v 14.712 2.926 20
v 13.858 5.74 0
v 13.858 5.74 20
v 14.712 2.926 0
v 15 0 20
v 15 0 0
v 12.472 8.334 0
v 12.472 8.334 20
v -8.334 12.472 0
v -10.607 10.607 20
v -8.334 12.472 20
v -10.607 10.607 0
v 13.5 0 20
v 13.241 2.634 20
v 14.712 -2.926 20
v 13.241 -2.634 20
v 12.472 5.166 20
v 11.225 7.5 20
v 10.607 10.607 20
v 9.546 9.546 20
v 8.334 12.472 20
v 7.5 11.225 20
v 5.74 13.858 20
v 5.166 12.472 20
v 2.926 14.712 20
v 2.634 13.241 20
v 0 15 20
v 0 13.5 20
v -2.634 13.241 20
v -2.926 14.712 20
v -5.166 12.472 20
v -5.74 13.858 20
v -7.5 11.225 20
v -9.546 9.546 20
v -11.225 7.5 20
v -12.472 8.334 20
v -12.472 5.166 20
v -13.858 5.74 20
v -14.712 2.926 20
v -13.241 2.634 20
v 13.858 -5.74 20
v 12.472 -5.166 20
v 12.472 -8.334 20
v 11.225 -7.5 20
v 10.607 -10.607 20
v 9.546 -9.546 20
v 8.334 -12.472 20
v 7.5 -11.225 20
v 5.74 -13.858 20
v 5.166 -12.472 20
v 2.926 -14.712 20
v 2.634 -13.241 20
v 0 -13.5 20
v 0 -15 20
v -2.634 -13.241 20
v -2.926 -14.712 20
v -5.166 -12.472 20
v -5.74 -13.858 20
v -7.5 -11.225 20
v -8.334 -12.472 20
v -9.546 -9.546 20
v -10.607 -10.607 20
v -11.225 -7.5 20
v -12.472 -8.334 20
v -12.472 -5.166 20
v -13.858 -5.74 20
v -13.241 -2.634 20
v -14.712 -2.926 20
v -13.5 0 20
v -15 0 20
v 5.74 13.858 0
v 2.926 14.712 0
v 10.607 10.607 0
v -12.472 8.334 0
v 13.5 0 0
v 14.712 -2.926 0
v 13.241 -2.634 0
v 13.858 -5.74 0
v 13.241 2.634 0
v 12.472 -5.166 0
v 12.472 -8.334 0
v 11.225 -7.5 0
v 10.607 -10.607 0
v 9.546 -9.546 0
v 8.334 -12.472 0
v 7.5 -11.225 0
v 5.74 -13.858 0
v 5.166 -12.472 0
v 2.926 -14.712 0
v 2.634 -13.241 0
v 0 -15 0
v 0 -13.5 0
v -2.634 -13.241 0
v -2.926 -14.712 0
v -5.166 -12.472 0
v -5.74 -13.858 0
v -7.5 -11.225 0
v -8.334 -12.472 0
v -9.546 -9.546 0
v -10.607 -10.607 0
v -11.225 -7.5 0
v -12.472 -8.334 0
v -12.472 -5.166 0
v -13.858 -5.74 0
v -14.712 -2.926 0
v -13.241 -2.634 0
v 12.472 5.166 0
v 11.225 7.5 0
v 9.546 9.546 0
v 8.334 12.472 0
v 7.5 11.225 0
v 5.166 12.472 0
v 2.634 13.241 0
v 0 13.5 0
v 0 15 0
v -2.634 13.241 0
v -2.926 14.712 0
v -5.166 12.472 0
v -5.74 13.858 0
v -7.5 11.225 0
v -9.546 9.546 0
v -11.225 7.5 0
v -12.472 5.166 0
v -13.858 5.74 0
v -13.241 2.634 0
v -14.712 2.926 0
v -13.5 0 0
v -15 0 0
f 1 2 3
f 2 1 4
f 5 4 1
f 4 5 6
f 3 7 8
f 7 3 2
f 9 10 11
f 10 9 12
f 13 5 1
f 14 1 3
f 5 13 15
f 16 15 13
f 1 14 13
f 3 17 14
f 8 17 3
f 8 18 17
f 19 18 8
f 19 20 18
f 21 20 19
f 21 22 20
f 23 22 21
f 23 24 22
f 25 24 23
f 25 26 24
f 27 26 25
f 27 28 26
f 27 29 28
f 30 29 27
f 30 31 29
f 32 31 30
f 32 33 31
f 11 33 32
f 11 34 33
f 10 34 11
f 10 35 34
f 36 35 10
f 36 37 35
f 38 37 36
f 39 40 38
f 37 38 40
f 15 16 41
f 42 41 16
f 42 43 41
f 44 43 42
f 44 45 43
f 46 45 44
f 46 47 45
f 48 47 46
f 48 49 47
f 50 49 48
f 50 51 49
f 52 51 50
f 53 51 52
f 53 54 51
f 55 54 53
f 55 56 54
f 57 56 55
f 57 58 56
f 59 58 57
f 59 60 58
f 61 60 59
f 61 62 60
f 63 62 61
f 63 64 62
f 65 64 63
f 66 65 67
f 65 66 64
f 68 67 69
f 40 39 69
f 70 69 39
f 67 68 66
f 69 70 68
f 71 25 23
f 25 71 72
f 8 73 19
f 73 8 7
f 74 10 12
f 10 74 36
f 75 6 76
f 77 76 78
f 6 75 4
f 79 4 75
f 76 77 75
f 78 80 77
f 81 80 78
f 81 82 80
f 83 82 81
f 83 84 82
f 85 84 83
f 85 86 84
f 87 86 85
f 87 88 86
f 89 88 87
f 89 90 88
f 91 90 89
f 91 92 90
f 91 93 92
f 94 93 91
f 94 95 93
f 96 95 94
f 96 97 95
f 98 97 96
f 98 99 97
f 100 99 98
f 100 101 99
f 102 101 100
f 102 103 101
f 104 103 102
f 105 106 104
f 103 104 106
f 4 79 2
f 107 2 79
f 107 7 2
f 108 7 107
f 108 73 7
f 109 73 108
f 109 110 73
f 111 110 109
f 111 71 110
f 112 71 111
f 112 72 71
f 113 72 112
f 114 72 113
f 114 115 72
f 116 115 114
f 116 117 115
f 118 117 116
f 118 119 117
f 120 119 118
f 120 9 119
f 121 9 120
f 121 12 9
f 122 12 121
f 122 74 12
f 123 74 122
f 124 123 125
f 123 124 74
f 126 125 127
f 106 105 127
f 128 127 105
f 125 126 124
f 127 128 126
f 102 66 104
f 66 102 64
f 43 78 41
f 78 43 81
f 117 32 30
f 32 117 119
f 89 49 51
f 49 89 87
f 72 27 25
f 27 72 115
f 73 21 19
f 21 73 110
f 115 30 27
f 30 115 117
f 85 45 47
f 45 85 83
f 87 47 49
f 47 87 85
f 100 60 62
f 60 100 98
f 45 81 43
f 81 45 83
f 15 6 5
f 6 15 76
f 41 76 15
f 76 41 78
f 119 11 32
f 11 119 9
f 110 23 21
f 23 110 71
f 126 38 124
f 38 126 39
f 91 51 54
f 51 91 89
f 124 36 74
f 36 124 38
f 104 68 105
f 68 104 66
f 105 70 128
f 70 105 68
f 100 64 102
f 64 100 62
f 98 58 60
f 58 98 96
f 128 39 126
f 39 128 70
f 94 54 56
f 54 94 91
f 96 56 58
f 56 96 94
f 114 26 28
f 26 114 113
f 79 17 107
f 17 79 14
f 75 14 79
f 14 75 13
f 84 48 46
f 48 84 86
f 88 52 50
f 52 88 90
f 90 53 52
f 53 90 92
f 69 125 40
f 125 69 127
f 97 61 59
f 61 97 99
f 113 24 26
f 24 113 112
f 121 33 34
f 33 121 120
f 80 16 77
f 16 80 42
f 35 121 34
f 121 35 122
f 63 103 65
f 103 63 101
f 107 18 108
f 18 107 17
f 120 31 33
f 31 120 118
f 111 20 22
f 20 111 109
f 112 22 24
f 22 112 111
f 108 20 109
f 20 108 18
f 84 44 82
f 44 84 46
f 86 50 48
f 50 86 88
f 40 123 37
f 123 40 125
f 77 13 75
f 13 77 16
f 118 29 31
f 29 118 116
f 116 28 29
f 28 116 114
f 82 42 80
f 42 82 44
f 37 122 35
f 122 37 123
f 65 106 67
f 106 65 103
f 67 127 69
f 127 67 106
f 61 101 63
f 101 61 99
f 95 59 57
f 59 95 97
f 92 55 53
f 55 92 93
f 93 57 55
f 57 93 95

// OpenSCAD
$fn = 32;

// ----------------------------------------------------------------------
// Thin tube: 1.5 mm wall
// ----------------------------------------------------------------------

// --- parameters (mm) ---
tube_od = 30;             // outer diameter
tube_h = 20;              // height, Z
wall = 1.5;               // wall thickness
fit_tol = 0.02;           // tolerance for press fits, mm
free_tol = 0.2;           // tolerance for clearance fits, mm

difference() {
  cylinder(h = tube_h, d = tube_od);
  translate([0, 0, -1]) cylinder(h = tube_h + 2, d = tube_od - 2 * wall);
}
